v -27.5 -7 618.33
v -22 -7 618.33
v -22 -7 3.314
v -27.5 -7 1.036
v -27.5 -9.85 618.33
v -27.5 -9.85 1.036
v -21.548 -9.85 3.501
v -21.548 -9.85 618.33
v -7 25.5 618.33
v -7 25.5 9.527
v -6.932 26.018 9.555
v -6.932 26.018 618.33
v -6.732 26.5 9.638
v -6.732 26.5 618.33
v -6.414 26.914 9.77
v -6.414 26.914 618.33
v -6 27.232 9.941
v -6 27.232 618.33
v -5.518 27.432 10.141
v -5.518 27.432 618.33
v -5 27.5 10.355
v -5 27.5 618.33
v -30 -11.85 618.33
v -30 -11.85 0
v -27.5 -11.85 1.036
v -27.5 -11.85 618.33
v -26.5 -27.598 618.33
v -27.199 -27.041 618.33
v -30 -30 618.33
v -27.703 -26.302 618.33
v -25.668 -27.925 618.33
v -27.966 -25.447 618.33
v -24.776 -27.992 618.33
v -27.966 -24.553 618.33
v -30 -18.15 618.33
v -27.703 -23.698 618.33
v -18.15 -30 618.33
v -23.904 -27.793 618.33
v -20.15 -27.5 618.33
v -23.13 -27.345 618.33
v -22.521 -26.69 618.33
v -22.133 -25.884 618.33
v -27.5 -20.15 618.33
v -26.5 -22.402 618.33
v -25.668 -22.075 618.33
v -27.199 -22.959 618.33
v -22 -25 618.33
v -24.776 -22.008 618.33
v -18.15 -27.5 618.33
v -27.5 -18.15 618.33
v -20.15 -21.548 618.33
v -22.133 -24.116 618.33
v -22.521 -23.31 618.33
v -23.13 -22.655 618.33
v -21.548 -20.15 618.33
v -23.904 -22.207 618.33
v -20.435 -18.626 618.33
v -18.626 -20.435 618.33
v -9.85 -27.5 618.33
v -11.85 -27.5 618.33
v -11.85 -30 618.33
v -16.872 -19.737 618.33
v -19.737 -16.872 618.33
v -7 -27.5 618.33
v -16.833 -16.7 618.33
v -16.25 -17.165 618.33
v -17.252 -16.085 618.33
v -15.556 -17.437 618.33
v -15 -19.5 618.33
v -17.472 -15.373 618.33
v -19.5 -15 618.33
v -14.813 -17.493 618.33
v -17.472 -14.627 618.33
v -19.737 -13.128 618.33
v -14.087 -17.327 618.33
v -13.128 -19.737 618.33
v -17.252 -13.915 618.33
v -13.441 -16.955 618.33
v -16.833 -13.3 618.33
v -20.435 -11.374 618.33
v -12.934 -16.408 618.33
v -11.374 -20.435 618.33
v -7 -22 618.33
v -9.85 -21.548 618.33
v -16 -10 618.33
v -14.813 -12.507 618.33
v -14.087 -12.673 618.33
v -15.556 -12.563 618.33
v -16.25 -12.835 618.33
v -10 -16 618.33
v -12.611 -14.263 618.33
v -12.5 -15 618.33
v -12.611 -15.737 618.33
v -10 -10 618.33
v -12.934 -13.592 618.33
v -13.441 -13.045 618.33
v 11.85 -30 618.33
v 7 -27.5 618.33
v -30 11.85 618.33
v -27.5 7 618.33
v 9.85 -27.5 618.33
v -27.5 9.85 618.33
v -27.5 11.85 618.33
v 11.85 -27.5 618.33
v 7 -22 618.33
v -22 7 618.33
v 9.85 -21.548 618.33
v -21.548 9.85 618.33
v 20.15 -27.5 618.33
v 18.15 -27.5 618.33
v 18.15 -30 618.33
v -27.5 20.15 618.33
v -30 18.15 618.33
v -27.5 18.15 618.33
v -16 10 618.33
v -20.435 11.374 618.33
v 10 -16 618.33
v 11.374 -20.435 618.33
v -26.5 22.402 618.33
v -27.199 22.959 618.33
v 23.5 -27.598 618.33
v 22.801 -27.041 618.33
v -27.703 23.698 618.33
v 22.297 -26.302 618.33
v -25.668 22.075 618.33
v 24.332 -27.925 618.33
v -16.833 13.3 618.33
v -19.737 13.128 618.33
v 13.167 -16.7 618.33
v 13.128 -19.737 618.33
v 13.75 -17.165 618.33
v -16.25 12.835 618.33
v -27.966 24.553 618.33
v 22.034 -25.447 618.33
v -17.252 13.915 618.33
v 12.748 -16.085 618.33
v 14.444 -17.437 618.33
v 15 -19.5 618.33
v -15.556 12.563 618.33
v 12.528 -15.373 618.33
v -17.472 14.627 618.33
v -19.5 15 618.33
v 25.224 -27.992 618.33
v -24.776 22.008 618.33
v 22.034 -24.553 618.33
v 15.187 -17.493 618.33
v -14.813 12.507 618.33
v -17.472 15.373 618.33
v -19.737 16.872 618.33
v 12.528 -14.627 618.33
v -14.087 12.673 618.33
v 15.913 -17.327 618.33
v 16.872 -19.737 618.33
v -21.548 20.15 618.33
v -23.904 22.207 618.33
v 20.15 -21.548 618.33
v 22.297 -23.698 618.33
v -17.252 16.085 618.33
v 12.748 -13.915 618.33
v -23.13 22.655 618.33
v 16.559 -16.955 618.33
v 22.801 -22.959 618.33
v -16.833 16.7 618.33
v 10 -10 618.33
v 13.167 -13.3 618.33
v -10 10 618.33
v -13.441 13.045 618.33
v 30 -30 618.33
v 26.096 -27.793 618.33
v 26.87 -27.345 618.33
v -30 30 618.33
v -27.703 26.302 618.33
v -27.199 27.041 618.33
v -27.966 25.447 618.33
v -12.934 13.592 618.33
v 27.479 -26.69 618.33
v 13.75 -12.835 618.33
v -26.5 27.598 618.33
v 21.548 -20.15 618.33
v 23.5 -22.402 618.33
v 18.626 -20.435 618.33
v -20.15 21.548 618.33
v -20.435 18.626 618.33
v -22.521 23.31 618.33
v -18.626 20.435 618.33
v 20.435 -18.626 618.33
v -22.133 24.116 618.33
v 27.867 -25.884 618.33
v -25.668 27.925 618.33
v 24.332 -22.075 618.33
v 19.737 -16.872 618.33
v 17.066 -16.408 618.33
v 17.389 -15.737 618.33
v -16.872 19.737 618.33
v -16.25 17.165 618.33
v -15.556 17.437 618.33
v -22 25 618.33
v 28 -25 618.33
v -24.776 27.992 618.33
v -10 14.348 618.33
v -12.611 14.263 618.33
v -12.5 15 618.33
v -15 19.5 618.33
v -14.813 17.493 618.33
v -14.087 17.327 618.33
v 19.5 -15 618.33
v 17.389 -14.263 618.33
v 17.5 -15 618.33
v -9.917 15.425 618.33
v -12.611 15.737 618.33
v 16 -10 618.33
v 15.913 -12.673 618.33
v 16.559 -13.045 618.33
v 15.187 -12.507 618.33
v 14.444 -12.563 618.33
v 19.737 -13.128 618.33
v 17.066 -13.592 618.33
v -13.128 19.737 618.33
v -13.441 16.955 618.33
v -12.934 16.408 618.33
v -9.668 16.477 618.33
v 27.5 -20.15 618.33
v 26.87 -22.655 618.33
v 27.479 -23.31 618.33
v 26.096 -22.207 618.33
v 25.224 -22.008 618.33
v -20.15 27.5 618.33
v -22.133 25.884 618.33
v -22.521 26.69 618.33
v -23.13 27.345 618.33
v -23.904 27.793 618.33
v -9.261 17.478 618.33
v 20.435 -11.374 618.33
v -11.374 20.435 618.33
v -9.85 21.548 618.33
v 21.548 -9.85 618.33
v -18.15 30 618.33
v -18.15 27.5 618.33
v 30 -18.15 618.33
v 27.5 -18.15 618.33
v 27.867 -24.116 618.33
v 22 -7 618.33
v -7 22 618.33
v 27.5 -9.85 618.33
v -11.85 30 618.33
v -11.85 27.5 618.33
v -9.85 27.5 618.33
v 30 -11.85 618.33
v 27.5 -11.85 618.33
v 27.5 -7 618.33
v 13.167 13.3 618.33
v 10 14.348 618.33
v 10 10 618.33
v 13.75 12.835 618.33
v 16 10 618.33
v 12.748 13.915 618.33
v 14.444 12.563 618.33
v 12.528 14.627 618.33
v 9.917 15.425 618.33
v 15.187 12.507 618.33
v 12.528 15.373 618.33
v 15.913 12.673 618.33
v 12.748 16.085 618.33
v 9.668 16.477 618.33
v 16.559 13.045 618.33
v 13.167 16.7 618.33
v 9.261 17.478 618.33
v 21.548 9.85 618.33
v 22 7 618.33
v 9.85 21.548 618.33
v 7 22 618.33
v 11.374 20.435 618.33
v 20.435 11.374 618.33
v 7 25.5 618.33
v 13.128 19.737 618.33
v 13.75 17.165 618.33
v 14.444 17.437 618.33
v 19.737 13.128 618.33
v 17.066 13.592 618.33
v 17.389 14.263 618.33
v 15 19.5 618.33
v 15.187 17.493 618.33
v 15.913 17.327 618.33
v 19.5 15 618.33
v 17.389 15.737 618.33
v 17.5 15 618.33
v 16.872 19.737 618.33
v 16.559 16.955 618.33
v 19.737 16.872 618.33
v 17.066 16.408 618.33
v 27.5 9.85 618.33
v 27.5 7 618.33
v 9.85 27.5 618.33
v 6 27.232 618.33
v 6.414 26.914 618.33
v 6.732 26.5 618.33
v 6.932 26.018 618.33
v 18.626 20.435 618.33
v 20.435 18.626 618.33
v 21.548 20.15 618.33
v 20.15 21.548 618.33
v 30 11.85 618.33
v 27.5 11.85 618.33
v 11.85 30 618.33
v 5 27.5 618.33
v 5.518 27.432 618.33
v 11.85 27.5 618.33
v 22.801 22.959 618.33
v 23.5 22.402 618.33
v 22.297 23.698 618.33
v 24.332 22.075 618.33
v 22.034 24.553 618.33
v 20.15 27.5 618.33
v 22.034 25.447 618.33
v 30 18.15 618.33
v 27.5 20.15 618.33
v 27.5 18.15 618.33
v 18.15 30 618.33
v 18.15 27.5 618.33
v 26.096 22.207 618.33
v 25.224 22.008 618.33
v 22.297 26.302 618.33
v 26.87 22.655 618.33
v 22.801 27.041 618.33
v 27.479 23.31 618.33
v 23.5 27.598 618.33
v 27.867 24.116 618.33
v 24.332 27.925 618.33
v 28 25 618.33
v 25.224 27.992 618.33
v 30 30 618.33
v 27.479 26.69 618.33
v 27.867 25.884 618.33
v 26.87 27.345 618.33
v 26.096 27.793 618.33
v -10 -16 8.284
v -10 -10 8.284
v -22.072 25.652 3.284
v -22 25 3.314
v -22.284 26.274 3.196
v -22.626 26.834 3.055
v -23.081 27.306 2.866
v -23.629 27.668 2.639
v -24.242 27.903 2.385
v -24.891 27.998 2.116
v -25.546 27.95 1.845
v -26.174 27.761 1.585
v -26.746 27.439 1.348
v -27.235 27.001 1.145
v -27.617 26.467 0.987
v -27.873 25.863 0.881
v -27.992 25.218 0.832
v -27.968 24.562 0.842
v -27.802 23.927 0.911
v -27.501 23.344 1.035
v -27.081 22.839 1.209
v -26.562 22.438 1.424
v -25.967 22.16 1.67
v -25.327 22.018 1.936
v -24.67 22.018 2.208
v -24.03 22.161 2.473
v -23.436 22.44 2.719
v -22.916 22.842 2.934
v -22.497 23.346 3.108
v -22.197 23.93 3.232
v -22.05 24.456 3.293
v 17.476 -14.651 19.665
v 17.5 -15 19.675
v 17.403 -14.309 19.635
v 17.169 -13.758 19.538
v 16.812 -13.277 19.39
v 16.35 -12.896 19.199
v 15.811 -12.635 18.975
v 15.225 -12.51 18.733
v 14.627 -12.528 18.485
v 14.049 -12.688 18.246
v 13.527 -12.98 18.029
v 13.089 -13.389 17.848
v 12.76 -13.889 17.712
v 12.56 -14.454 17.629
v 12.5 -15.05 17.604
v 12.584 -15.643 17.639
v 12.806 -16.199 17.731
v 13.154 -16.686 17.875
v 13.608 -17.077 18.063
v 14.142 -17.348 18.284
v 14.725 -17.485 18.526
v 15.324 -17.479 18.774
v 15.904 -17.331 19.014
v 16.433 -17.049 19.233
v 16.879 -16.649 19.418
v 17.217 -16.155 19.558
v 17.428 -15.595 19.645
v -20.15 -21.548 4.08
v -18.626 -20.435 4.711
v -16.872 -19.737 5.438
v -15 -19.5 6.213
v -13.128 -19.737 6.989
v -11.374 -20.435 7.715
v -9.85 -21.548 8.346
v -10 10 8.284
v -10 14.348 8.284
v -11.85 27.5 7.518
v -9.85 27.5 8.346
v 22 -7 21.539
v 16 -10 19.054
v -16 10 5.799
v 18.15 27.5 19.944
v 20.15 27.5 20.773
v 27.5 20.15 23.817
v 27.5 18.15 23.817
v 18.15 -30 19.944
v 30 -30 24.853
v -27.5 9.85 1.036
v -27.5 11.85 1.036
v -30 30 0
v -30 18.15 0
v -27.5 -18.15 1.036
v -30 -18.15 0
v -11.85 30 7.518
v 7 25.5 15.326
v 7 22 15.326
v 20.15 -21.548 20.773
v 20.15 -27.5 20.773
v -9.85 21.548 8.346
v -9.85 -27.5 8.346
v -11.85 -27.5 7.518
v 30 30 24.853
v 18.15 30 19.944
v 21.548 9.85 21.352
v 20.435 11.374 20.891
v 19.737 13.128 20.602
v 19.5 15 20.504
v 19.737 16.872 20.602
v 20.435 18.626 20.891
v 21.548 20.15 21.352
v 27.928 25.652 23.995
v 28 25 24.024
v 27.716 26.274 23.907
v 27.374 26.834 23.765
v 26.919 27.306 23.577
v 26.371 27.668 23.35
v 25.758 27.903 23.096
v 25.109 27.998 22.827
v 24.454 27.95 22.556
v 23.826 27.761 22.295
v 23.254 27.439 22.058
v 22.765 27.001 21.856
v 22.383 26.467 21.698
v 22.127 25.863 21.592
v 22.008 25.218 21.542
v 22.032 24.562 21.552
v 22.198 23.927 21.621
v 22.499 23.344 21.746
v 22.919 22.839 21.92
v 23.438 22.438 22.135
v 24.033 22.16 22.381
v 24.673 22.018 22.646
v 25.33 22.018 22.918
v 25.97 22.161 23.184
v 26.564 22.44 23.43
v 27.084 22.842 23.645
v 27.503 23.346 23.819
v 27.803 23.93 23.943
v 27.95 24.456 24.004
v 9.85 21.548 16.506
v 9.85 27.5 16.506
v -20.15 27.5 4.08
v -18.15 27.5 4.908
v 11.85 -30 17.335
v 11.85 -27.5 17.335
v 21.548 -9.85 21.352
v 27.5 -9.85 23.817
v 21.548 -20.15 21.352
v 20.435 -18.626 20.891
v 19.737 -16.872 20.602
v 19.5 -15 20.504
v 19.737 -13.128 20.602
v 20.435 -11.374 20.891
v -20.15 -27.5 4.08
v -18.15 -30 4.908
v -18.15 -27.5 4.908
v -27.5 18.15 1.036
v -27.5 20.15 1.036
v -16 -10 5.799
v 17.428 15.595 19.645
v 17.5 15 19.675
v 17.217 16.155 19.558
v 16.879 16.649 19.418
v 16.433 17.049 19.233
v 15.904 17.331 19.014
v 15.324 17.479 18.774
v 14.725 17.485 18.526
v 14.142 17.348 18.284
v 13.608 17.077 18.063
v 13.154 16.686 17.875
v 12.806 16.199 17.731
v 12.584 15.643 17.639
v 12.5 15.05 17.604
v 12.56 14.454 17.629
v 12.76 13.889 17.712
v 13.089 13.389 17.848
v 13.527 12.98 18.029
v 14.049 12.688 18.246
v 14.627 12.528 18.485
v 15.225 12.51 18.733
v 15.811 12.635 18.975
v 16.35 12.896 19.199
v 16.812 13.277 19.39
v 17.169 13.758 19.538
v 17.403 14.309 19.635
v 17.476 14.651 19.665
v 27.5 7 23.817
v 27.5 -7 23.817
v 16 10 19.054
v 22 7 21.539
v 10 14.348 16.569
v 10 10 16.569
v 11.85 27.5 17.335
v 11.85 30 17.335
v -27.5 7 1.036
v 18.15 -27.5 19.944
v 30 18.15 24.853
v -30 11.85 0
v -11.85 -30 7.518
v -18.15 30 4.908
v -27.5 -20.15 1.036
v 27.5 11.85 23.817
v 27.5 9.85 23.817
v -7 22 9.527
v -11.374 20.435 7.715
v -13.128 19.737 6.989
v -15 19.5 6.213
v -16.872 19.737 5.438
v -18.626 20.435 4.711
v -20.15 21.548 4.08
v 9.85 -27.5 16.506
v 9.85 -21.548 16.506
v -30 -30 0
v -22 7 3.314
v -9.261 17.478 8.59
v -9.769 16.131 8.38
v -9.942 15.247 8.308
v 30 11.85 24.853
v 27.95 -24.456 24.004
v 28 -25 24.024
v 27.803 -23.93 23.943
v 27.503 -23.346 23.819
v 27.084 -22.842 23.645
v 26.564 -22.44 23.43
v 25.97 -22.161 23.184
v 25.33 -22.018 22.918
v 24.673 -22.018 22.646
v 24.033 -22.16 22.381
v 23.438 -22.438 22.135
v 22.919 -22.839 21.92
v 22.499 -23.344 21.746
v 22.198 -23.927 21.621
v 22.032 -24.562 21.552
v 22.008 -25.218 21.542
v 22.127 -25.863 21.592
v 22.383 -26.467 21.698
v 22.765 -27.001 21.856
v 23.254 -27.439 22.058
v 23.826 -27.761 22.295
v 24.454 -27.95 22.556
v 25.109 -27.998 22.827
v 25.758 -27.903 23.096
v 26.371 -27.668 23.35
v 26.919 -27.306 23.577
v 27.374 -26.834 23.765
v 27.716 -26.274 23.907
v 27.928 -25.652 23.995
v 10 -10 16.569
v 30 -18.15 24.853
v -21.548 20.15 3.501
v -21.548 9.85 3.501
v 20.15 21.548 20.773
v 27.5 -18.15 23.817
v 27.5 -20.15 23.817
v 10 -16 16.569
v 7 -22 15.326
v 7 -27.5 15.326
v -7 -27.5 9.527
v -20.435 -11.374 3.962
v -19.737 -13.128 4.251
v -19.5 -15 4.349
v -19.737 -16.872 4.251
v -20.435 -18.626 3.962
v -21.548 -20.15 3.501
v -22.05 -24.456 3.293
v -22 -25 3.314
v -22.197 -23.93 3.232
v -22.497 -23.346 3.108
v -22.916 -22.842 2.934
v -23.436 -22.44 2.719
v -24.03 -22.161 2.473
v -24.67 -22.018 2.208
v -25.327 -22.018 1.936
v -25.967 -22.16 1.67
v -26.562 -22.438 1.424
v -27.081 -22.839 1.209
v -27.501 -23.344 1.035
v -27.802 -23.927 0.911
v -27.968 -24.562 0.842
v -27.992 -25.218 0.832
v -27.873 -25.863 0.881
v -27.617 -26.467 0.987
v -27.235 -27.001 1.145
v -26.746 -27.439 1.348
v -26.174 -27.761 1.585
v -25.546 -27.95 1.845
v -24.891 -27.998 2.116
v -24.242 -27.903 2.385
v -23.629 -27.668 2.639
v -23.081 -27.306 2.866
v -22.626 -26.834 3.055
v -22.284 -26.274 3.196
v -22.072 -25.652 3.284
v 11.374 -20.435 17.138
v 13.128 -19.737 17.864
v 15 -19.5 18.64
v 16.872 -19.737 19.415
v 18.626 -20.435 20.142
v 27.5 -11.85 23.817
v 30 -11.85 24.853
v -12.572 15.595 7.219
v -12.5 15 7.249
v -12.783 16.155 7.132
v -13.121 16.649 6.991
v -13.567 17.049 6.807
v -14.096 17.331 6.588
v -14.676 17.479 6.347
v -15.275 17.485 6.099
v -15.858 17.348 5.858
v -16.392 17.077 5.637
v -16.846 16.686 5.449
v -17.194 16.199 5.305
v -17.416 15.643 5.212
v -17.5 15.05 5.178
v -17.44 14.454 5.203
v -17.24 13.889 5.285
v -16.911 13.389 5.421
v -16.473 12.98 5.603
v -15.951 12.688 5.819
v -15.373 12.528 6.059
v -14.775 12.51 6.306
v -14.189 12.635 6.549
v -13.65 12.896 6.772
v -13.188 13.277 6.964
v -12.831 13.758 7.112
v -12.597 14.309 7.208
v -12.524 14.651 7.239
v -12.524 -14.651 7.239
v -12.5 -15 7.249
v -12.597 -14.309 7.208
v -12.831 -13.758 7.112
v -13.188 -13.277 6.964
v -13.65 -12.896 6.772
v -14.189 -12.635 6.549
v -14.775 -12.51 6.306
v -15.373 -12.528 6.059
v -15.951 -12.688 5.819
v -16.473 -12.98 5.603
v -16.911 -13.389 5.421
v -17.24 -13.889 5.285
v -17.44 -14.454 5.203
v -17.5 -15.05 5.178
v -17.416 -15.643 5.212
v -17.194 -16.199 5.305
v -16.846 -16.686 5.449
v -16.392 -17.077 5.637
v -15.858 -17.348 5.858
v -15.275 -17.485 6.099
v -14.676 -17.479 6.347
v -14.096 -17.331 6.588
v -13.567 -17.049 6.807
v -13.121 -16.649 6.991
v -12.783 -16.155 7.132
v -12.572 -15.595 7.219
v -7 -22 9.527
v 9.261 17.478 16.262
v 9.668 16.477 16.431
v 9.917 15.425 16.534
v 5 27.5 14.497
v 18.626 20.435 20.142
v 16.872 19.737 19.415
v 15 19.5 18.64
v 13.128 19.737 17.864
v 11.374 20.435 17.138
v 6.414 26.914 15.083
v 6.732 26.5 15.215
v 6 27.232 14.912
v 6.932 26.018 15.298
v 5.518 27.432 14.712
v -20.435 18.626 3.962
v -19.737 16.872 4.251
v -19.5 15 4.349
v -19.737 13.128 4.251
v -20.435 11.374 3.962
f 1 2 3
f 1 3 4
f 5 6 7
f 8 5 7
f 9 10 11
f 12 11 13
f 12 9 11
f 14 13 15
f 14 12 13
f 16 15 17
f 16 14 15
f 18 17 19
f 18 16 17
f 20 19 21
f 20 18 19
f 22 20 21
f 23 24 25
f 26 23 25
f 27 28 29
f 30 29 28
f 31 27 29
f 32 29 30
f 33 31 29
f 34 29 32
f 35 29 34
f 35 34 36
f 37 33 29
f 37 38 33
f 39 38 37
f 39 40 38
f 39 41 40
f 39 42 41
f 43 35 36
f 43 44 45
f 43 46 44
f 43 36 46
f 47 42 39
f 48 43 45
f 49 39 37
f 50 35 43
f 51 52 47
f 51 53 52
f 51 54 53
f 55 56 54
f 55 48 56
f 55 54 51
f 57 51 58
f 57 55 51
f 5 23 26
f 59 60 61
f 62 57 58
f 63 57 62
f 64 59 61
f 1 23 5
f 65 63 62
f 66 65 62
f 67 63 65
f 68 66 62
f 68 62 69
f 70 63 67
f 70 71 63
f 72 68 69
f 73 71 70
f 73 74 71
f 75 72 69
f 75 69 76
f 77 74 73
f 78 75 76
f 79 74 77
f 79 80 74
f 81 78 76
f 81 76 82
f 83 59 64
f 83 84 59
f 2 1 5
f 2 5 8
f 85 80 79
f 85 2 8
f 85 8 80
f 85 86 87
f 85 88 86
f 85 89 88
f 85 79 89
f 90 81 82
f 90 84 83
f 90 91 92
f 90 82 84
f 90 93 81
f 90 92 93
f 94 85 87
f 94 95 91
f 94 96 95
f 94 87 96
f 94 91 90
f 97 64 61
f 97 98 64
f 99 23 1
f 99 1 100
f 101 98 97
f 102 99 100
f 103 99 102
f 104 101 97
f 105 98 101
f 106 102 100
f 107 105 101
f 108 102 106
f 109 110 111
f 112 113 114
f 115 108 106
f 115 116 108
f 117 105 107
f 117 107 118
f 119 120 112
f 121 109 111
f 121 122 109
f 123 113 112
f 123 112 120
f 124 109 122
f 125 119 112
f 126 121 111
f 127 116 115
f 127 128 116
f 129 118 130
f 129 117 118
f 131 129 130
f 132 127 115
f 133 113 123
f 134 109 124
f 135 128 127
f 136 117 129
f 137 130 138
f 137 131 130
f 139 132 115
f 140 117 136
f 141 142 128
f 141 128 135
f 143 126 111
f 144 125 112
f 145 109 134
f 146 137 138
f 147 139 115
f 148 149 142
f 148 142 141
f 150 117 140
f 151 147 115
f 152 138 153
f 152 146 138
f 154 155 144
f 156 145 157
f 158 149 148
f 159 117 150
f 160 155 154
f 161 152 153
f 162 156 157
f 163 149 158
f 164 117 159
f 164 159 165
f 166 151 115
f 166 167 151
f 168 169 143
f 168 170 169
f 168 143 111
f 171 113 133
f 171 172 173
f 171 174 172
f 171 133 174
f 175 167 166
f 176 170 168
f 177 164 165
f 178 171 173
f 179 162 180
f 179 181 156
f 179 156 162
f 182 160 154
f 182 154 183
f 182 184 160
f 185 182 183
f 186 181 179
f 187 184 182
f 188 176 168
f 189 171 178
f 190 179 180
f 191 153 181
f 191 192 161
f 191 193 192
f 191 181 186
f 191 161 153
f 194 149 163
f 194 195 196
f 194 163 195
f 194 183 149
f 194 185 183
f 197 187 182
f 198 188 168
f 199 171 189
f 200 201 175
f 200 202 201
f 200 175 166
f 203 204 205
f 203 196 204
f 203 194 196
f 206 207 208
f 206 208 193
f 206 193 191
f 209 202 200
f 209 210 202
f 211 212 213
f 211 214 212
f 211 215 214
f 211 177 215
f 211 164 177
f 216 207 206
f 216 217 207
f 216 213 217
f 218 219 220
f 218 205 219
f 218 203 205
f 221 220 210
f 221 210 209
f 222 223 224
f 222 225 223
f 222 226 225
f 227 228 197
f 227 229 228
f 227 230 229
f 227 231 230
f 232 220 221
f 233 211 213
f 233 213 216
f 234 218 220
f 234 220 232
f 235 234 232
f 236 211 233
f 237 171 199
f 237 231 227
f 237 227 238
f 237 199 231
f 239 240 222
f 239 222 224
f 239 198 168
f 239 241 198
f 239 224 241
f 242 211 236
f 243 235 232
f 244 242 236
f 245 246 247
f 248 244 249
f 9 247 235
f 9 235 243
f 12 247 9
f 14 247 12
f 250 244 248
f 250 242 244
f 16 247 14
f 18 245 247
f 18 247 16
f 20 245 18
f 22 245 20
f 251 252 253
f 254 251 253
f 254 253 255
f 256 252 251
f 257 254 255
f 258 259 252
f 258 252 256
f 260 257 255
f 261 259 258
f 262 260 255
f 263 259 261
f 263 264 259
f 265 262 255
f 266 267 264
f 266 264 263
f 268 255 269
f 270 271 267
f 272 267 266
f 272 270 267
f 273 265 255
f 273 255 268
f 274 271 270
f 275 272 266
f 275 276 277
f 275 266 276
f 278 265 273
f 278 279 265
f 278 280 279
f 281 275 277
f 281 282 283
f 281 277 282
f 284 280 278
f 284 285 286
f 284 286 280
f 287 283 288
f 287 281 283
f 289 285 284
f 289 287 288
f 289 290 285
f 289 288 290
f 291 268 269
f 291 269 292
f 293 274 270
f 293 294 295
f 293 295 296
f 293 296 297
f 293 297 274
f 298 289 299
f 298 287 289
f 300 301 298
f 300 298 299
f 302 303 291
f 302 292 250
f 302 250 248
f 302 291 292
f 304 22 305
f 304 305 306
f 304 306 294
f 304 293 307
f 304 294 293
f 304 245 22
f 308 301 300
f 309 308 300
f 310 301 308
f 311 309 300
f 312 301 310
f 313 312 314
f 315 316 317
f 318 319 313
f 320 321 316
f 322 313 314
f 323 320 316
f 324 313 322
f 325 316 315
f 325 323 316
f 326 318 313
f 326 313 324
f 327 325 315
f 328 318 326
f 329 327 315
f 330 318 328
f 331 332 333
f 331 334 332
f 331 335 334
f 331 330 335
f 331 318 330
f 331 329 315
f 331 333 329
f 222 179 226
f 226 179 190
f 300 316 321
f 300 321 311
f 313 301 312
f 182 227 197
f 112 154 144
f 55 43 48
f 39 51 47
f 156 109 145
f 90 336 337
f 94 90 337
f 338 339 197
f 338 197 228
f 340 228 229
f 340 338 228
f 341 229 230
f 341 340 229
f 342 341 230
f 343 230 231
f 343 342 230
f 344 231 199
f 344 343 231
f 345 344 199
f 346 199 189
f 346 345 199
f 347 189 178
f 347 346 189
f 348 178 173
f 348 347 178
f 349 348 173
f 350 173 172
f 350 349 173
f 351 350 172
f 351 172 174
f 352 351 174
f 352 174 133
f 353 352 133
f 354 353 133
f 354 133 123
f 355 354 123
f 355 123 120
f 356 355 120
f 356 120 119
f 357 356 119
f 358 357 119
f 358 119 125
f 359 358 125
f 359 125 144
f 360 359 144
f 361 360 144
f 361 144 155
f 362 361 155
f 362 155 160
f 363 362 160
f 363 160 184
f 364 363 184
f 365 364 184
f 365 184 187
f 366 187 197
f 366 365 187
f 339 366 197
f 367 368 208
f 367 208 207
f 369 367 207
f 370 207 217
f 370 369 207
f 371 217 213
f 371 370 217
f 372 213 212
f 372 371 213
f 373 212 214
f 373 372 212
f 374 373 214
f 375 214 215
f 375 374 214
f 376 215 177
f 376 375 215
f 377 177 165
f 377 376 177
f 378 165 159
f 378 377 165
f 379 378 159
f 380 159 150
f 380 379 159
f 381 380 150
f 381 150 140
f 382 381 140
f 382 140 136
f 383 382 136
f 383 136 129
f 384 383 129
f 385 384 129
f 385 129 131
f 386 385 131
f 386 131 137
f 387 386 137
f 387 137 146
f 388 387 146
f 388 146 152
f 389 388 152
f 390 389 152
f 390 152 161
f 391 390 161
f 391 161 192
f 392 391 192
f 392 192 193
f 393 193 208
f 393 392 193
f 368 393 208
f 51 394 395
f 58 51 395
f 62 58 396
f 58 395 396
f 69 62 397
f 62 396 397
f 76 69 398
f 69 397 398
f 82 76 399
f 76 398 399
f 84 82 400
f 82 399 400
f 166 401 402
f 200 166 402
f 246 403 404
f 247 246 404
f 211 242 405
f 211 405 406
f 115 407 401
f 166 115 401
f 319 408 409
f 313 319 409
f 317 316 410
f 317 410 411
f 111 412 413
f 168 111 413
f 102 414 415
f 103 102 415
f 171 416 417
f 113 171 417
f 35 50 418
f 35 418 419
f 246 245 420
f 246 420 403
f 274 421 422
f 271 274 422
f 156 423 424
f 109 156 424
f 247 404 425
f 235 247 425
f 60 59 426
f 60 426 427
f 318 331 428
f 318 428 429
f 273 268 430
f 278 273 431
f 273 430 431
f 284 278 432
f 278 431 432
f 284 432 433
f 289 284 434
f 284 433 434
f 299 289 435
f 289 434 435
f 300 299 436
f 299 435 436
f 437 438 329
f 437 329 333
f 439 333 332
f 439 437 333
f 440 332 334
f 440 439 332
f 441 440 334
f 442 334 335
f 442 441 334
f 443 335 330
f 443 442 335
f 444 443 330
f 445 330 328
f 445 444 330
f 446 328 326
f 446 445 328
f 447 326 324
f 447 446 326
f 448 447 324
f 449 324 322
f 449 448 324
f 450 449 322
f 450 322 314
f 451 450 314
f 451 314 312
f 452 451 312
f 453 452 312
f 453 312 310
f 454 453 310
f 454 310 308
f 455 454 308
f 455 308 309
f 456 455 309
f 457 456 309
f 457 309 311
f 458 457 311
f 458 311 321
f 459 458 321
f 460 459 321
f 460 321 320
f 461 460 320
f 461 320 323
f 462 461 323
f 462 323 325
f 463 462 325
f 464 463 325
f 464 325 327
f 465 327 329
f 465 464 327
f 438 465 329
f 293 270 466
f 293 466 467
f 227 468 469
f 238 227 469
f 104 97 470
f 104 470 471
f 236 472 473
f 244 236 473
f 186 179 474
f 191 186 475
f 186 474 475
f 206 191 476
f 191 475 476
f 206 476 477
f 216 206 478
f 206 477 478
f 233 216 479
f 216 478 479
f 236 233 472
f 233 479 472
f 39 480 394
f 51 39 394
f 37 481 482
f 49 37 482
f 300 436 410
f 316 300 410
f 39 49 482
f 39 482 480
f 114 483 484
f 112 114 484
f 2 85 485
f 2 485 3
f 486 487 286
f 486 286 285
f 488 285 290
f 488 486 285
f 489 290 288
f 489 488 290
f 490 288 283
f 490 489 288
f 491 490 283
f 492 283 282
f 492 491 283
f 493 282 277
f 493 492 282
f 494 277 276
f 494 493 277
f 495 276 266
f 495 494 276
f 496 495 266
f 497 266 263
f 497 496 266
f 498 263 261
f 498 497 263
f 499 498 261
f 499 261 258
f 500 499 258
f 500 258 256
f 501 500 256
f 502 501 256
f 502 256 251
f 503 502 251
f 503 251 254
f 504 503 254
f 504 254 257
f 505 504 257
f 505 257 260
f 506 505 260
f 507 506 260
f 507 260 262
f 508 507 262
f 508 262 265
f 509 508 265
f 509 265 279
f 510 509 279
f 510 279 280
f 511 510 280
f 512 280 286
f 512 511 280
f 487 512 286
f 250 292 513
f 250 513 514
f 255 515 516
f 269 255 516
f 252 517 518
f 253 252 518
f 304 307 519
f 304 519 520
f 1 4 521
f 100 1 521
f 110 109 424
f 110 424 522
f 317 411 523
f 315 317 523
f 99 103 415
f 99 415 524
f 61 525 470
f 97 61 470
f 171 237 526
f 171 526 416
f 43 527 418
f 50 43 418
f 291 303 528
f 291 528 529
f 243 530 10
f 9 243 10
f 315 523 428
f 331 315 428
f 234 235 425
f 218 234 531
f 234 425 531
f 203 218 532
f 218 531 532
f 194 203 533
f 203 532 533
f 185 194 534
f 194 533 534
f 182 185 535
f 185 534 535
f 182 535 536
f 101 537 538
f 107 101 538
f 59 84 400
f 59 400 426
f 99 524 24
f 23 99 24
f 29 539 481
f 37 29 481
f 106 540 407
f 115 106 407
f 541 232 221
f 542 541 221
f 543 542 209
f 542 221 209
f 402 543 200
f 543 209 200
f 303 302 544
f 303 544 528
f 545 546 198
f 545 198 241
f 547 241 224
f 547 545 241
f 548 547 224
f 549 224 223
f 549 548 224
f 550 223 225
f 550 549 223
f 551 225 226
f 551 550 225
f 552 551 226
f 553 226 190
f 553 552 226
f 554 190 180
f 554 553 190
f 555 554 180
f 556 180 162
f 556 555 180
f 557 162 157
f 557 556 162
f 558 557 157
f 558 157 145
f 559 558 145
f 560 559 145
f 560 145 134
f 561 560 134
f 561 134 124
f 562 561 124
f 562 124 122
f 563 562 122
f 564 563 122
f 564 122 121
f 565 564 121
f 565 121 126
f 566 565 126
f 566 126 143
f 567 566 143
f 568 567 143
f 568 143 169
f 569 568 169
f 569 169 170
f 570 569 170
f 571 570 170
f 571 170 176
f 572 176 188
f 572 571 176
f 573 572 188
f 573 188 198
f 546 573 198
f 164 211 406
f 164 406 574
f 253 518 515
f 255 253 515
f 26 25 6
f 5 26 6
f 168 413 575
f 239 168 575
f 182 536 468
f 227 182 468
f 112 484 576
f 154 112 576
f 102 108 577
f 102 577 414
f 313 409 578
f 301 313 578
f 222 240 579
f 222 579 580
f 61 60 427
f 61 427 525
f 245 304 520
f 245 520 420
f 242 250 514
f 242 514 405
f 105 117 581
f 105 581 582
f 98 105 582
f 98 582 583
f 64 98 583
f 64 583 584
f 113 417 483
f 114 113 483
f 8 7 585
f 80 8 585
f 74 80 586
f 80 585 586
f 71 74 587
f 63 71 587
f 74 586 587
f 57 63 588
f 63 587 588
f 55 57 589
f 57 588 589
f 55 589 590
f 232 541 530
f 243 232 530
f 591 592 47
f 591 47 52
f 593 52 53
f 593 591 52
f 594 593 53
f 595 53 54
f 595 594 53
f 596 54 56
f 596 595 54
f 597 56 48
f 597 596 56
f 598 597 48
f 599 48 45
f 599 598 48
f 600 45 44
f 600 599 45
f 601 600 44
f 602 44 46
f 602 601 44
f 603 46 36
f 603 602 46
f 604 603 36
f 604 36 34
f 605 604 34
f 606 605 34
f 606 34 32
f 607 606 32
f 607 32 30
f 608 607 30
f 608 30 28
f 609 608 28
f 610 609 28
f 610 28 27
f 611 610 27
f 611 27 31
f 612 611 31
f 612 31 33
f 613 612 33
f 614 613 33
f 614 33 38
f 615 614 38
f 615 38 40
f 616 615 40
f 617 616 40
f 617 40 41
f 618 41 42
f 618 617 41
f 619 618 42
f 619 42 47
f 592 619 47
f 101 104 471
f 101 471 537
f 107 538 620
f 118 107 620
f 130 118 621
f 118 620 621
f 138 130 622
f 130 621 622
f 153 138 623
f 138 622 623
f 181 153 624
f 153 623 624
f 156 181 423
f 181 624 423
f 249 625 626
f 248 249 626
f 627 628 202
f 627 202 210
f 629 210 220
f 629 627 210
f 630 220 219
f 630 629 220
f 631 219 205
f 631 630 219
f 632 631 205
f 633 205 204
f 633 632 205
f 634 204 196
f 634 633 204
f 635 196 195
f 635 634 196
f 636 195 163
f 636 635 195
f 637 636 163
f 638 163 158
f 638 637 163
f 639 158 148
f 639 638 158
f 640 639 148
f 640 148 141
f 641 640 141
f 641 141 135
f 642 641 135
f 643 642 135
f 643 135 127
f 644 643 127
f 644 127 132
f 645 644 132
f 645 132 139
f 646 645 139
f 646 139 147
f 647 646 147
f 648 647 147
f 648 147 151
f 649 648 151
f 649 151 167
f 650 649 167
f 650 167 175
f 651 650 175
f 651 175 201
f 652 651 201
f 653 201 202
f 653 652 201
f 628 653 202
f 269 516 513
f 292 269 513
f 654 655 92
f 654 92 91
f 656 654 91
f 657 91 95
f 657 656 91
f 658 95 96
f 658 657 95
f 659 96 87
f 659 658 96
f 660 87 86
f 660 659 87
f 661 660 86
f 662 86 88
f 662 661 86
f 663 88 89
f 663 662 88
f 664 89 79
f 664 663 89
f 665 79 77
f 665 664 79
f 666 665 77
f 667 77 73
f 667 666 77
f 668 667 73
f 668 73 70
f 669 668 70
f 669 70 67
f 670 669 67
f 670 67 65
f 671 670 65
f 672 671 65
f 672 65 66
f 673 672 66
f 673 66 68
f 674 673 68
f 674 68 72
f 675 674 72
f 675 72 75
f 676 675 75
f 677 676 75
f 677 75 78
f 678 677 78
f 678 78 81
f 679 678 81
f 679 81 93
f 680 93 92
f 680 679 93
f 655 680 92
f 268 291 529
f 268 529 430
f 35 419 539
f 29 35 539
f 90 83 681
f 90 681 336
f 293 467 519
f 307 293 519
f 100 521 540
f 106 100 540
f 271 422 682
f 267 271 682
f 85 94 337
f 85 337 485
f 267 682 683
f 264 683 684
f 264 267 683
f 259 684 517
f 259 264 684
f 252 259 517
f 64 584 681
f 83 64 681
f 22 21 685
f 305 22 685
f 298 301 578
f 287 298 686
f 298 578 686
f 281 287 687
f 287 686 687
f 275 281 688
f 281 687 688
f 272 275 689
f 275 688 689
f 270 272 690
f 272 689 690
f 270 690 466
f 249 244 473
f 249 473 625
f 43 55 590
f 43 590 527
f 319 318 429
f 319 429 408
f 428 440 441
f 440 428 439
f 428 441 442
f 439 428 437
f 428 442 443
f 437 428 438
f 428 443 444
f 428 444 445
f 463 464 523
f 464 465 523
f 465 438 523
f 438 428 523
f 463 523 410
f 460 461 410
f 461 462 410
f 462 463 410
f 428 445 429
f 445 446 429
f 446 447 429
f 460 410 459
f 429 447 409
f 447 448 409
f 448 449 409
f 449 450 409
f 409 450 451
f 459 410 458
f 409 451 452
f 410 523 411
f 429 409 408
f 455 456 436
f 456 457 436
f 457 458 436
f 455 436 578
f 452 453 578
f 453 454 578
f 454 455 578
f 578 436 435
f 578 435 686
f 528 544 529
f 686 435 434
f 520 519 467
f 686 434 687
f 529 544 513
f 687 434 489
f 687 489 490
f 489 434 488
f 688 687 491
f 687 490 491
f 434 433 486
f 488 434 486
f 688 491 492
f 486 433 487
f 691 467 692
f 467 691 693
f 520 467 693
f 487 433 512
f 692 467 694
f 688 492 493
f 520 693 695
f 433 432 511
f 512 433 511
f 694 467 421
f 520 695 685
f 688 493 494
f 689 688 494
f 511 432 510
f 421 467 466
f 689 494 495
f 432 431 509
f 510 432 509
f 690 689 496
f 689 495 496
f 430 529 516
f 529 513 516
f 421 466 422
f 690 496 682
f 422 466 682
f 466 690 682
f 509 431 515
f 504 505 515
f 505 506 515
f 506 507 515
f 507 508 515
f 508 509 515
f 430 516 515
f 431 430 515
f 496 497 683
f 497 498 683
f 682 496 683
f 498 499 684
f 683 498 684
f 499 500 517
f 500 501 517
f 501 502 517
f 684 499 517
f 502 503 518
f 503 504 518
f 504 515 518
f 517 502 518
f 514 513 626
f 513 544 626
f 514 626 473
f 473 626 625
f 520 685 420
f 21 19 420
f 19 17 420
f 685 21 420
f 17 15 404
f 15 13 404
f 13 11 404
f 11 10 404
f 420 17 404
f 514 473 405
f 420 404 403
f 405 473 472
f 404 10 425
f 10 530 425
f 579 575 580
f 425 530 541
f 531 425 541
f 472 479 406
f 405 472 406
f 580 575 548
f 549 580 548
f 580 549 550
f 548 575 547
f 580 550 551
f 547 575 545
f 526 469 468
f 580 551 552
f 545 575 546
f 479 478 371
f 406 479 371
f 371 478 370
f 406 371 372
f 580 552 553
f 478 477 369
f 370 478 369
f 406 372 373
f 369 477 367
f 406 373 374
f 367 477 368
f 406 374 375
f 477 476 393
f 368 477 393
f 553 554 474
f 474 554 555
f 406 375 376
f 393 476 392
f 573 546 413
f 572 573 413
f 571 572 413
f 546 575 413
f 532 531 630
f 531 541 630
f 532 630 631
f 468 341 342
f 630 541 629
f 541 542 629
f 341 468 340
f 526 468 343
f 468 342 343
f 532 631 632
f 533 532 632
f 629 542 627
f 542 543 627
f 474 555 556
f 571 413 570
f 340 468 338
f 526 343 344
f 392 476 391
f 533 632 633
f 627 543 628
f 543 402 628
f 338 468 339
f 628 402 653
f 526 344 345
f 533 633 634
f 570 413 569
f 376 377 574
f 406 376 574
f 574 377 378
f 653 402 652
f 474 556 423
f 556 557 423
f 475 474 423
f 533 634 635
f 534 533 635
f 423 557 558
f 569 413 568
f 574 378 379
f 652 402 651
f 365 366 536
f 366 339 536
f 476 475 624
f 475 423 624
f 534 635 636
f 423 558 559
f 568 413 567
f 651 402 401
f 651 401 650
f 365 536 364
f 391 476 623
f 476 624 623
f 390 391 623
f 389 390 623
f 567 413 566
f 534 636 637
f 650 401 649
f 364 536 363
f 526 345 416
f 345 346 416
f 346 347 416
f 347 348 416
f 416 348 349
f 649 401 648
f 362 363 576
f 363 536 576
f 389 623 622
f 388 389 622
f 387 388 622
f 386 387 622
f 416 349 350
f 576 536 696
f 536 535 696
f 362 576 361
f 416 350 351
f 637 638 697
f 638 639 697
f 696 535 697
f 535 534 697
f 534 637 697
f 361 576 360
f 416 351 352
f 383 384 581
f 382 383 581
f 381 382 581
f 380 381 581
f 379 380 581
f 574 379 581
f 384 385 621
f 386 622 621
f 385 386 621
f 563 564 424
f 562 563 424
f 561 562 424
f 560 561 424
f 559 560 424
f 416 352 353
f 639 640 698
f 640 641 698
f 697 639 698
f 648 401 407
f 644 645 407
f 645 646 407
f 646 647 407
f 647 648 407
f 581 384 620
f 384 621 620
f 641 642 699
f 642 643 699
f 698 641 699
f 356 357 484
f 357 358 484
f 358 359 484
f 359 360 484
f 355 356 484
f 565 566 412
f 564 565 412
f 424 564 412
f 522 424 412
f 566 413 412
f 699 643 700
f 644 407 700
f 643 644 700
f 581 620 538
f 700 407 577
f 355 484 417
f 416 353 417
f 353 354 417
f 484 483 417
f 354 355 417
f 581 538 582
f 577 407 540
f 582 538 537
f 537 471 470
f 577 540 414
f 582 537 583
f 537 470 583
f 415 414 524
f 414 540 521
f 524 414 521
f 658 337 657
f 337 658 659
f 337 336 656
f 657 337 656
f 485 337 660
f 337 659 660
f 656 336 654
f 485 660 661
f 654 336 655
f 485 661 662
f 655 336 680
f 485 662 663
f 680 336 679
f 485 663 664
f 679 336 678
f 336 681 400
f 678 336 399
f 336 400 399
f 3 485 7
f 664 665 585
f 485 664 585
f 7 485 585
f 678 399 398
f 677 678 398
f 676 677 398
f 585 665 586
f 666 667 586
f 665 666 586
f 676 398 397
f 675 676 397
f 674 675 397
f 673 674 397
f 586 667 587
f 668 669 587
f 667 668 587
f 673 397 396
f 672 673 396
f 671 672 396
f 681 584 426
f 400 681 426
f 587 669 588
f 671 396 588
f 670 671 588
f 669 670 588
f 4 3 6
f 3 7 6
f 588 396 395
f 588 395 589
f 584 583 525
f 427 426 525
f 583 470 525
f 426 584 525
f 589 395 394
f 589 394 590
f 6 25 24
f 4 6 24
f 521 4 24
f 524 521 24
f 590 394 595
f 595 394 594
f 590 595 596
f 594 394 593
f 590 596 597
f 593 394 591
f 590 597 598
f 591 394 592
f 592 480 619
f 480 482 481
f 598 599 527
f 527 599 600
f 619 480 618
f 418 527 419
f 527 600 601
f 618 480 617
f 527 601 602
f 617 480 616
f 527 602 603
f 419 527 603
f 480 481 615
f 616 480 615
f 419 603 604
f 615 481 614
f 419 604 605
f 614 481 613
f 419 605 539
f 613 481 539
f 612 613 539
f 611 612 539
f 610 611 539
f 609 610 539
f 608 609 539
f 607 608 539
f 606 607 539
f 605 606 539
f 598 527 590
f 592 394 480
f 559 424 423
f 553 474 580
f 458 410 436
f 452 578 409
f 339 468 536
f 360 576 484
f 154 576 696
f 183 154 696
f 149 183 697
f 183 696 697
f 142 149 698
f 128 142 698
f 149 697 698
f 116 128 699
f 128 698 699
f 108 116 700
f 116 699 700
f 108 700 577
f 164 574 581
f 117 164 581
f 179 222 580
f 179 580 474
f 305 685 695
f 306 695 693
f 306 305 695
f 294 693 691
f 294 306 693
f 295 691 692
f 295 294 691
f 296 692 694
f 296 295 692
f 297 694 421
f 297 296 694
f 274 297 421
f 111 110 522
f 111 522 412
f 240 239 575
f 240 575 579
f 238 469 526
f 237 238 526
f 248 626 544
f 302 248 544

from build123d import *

# Parameters (mm, degrees)
F0_R          = 3
F0_R_2        = 2.5
F1_DEPTH      = 618.33
F2_R          = 2
F3_R          = 7
F5_DEPTH      = 30
F5_DEPTH_BACK = 30


# Not quite as in the source:
# - a feature names something its author has since deleted; it is built from what else it names


with BuildPart() as f1:
    # F0 (on Top) → F1 (new body)
    with BuildSketch(Plane.XY):
        with BuildLine():
            Line((18.15, -30), (30, -30))
            Line((30, -30), (30, -18.15))
            Line((30, -18.15), (27.5, -18.15))
            Line((27.5, -18.15), (27.5, -20.15))
            Line((27.5, -20.15), (21.5477069044, -20.15))
            ThreePointArc((21.5477069044, -20.15), (19.5, -15), (21.5477069044, -9.85))
            Line((21.5477069044, -9.85), (27.5, -9.85))
            Line((27.5, -9.85), (27.5, -11.85))
            Line((27.5, -11.85), (30, -11.85))
            Line((30, -11.85), (30, 11.85))
            Line((30, 11.85), (27.5, 11.85))
            Line((27.5, 11.85), (27.5, 9.85))
            Line((27.5, 9.85), (21.5477069044, 9.85))
            ThreePointArc((21.5477069044, 9.85), (19.5, 15), (21.5477069044, 20.15))
            Line((21.5477069044, 20.15), (27.5, 20.15))
            Line((27.5, 20.15), (27.5, 18.15))
            Line((27.5, 18.15), (30, 18.15))
            Line((30, 18.15), (30, 30))
            Line((30, 30), (18.15, 30))
            Line((18.15, 30), (18.15, 27.5))
            Line((18.15, 27.5), (20.15, 27.5))
            Line((20.15, 27.5), (20.15, 21.5477069044))
            ThreePointArc((20.15, 21.5477069044), (15, 19.5), (9.85, 21.5477069044))
            Line((9.85, 21.5477069044), (9.85, 27.5))
            Line((9.85, 27.5), (11.85, 27.5))
            Line((11.85, 27.5), (11.85, 30))
            Line((11.85, 30), (-11.85, 30))
            Line((-11.85, 30), (-11.85, 27.5))
            Line((-11.85, 27.5), (-9.85, 27.5))
            Line((-9.85, 27.5), (-9.85, 21.5477069044))
            ThreePointArc((-9.85, 21.5477069044), (-15, 19.5), (-20.15, 21.5477069044))
            Line((-20.15, 21.5477069044), (-20.15, 27.5))
            Line((-20.15, 27.5), (-18.15, 27.5))
            Line((-18.15, 27.5), (-18.15, 30))
            Line((-18.15, 30), (-30, 30))
            Line((-30, 30), (-30, 18.15))
            Line((-30, 18.15), (-27.5, 18.15))
            Line((-27.5, 18.15), (-27.5, 20.15))
            Line((-27.5, 20.15), (-21.5477069044, 20.15))
            ThreePointArc((-21.5477069044, 20.15), (-19.5, 15), (-21.5477069044, 9.85))
            Line((-21.5477069044, 9.85), (-27.5, 9.85))
            Line((-27.5, 9.85), (-27.5, 11.85))
            Line((-27.5, 11.85), (-30, 11.85))
            Line((-30, 11.85), (-30, -11.85))
            Line((-30, -11.85), (-27.5, -11.85))
            Line((-27.5, -11.85), (-27.5, -9.85))
            Line((-27.5, -9.85), (-21.5477069044, -9.85))
            ThreePointArc((-21.5477069044, -9.85), (-19.5, -15), (-21.5477069044, -20.15))
            Line((-21.5477069044, -20.15), (-27.5, -20.15))
            Line((-27.5, -20.15), (-27.5, -18.15))
            Line((-27.5, -18.15), (-30, -18.15))
            Line((-30, -18.15), (-30, -30))
            Line((-30, -30), (-18.15, -30))
            Line((-18.15, -30), (-18.15, -27.5))
            Line((-18.15, -27.5), (-20.15, -27.5))
            Line((-20.15, -27.5), (-20.15, -21.5477069044))
            ThreePointArc((-20.15, -21.5477069044), (-15, -19.5), (-9.85, -21.5477069044))
            Line((-9.85, -21.5477069044), (-9.85, -27.5))
            Line((-9.85, -27.5), (-11.85, -27.5))
            Line((-11.85, -27.5), (-11.85, -30))
            Line((-11.85, -30), (11.85, -30))
            Line((11.85, -30), (11.85, -27.5))
            Line((11.85, -27.5), (9.85, -27.5))
            Line((9.85, -27.5), (9.85, -21.5477069044))
            ThreePointArc((9.85, -21.5477069044), (15, -19.5), (20.15, -21.5477069044))
            Line((20.15, -21.5477069044), (20.15, -27.5))
            Line((20.15, -27.5), (18.15, -27.5))
            Line((18.15, -27.5), (18.15, -30))
        make_face()
        with Locations((-25, -25)):
            Circle(F0_R, mode=Mode.SUBTRACT)
        with Locations((-15, -15)):
            Circle(F0_R_2, mode=Mode.SUBTRACT)
        with Locations((25, -25)):
            Circle(F0_R, mode=Mode.SUBTRACT)
        with Locations((15, -15)):
            Circle(F0_R_2, mode=Mode.SUBTRACT)
        with Locations((-25, 25)):
            Circle(F0_R, mode=Mode.SUBTRACT)
        with Locations((-15, 15)):
            Circle(F0_R_2, mode=Mode.SUBTRACT)
        Polygon((-7, 22), (-7, 27.5), (0, 27.5), (7, 27.5), (7, 22), (10, 16), (10, 10), (16, 10), (22, 7), (27.5, 7), (27.5, 0), (27.5, -7), (22, -7), (16, -10), (10, -10), (10, -16), (7, -22), (7, -27.5), (0, -27.5), (-7, -27.5), (-7, -22), (-10, -16), (-10, -10), (-16, -10), (-22, -7), (-27.5, -7), (-27.5, 0), (-27.5, 7), (-22, 7), (-16, 10), (-10, 10), (-10, 16), align=None, mode=Mode.SUBTRACT)
        with Locations((15, 15)):
            Circle(F0_R_2, mode=Mode.SUBTRACT)
        with Locations((25, 25)):
            Circle(F0_R, mode=Mode.SUBTRACT)
    extrude(amount=F1_DEPTH)

    # F2
    f2_edges = [f1.edges().sort_by_distance(p)[0] for p in [
        (-7, 27.5, 309.165),
        (7, 27.5, 309.165),
    ]]
    fillet(f2_edges, radius=F2_R)

    # F3
    f3_edges = [f1.edges().sort_by_distance(p)[0] for p in [
        (-10, 16, 309.165),
        (10, 16, 309.165),
    ]]
    fillet(f3_edges, radius=F3_R)

    # F4 (on Front) → F5 (cut, two sides)
    with BuildSketch(Plane.XZ) as f5_sk:
        Polygon((227.6837248597, 106.7360936397), (-30, 0), (35.1751396755, -157.3467061341), (292.8588645352, -50.6106124944), align=None)
    extrude(amount=F5_DEPTH, mode=Mode.SUBTRACT)
    extrude(f5_sk.sketch, amount=-F5_DEPTH_BACK, mode=Mode.SUBTRACT)


solid = f1.part
